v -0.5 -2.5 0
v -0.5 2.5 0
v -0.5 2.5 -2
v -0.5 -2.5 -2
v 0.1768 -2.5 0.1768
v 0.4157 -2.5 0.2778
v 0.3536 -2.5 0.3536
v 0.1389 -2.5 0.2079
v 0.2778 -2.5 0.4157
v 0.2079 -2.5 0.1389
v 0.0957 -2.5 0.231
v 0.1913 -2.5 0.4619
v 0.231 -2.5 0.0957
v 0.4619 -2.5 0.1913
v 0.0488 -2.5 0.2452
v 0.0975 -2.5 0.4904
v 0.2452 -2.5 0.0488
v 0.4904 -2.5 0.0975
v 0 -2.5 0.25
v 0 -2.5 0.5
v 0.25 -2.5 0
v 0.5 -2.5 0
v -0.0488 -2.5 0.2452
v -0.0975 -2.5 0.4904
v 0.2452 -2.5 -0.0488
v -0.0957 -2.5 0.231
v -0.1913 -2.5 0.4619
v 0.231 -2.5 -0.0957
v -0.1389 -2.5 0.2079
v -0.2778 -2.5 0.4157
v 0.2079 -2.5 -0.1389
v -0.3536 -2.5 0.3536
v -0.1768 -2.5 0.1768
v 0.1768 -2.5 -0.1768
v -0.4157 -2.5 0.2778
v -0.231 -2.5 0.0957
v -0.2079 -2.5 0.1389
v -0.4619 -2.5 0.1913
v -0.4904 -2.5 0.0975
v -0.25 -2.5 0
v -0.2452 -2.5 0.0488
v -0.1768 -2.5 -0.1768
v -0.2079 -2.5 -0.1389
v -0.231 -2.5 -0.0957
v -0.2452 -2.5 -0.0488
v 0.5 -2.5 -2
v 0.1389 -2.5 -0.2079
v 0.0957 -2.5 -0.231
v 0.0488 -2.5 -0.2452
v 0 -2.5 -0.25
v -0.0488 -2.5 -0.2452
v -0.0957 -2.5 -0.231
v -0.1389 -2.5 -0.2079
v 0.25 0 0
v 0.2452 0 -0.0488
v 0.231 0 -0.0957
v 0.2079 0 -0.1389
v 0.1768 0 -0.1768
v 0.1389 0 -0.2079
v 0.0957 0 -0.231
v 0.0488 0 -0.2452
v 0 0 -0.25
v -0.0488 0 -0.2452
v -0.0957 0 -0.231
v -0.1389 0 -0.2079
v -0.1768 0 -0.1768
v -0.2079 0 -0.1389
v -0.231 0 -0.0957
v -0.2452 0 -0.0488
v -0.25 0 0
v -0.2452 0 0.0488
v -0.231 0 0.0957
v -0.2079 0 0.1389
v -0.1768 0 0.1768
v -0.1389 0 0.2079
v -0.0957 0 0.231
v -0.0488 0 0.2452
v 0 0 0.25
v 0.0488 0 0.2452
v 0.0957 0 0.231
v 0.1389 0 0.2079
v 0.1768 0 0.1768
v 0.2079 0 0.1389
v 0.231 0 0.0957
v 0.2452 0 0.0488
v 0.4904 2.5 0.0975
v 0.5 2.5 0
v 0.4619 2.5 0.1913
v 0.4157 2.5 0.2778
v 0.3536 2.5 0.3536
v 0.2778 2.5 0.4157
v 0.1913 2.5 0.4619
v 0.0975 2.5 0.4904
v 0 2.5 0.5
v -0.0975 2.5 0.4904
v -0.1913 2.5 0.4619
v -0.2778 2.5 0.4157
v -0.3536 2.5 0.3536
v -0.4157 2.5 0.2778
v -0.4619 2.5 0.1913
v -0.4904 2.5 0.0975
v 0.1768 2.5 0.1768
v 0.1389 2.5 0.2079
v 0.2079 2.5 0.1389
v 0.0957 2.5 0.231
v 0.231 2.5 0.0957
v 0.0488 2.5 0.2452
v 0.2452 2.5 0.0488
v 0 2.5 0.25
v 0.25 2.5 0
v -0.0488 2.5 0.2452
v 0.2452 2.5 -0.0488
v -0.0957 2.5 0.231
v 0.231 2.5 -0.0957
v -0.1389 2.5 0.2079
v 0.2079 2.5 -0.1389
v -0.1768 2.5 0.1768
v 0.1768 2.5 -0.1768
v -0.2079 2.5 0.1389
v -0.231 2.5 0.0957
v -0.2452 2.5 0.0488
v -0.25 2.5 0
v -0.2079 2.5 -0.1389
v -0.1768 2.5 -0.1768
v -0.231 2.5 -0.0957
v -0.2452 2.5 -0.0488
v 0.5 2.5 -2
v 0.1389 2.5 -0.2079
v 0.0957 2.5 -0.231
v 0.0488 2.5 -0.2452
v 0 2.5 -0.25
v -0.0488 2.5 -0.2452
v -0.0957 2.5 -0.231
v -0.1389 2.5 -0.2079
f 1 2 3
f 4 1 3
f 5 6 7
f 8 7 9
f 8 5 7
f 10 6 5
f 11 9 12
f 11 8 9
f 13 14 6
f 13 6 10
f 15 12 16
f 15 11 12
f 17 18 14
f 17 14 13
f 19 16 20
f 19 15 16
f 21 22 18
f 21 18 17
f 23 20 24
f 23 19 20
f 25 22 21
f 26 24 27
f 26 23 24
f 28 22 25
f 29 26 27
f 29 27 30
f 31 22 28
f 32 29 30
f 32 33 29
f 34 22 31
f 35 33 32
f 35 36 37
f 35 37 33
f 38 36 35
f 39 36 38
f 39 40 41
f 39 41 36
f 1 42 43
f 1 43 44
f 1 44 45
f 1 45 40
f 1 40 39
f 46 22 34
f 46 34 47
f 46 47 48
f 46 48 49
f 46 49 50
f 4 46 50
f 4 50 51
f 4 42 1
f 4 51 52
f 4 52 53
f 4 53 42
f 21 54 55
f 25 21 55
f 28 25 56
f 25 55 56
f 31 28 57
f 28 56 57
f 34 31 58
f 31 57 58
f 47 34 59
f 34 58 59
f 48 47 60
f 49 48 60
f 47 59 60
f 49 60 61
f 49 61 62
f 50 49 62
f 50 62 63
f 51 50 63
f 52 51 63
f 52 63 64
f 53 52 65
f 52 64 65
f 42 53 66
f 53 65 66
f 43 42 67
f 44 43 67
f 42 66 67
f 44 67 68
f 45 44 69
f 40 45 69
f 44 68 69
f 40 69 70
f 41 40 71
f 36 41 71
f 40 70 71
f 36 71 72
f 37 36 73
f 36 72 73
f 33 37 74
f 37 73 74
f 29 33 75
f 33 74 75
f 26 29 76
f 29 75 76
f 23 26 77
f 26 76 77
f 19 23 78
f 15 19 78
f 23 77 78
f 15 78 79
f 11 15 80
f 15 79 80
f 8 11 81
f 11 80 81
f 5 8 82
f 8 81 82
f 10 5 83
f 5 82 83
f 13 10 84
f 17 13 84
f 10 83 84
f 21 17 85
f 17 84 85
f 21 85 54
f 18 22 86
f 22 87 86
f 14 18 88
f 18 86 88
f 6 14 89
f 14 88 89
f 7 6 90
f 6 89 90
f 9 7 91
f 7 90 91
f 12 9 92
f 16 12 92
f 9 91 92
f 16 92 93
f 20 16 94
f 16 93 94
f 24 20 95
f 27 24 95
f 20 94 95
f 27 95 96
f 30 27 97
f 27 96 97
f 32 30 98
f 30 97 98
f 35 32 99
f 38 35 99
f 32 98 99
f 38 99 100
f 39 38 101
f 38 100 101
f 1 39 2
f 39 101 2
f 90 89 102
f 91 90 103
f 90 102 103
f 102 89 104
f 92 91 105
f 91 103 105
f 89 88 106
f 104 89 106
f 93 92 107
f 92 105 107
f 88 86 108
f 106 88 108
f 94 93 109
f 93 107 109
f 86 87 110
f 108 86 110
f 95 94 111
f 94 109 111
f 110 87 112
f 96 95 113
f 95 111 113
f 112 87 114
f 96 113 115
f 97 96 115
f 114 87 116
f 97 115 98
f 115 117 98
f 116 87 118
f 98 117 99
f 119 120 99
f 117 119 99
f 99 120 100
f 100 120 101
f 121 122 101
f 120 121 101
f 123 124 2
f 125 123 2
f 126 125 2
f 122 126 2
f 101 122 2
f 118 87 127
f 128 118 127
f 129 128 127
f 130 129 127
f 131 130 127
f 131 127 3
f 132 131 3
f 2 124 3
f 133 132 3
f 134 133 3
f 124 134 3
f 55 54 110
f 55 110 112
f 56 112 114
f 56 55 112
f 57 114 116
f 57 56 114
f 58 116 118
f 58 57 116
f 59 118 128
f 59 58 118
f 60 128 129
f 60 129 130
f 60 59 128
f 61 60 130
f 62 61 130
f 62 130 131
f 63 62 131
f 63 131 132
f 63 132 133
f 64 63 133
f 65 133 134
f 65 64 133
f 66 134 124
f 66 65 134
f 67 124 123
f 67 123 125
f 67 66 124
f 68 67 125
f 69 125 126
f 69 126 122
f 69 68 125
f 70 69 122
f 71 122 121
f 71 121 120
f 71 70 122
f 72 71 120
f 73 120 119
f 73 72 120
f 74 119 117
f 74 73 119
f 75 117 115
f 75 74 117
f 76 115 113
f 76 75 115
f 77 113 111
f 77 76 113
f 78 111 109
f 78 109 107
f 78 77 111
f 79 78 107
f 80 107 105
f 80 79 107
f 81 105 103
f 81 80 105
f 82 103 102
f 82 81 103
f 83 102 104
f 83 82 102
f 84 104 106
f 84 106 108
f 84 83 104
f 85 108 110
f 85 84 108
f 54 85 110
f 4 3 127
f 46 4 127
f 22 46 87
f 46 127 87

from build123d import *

# Parameters (mm, degrees)
SALIENTE_EXTRUIR1_DEPTH      = 2.5
SALIENTE_EXTRUIR1_DEPTH_BACK = 2.5
CROQUIS1_R                   = 0.25


with BuildPart() as part:
    # Croquis1 → Saliente-Extruir1 (new, two sides: drawn at the far end of the back side and taken through both)
    with BuildSketch(Plane(origin=(0, 0, 0), x_dir=(1, 0, 0), z_dir=(0, 1, 0)).offset(-SALIENTE_EXTRUIR1_DEPTH_BACK)):
        with BuildLine():
            Line((-0.5, 2), (0.5, 2))
            Line((0.5, 2), (0.5, 0))
            ThreePointArc((0.5, 0), (0, -0.5), (-0.5, 0))
            Line((-0.5, 0), (-0.5, 2))
        make_face()
        Circle(CROQUIS1_R, mode=Mode.SUBTRACT)
    extrude(amount=SALIENTE_EXTRUIR1_DEPTH + SALIENTE_EXTRUIR1_DEPTH_BACK)


solid = part.part
